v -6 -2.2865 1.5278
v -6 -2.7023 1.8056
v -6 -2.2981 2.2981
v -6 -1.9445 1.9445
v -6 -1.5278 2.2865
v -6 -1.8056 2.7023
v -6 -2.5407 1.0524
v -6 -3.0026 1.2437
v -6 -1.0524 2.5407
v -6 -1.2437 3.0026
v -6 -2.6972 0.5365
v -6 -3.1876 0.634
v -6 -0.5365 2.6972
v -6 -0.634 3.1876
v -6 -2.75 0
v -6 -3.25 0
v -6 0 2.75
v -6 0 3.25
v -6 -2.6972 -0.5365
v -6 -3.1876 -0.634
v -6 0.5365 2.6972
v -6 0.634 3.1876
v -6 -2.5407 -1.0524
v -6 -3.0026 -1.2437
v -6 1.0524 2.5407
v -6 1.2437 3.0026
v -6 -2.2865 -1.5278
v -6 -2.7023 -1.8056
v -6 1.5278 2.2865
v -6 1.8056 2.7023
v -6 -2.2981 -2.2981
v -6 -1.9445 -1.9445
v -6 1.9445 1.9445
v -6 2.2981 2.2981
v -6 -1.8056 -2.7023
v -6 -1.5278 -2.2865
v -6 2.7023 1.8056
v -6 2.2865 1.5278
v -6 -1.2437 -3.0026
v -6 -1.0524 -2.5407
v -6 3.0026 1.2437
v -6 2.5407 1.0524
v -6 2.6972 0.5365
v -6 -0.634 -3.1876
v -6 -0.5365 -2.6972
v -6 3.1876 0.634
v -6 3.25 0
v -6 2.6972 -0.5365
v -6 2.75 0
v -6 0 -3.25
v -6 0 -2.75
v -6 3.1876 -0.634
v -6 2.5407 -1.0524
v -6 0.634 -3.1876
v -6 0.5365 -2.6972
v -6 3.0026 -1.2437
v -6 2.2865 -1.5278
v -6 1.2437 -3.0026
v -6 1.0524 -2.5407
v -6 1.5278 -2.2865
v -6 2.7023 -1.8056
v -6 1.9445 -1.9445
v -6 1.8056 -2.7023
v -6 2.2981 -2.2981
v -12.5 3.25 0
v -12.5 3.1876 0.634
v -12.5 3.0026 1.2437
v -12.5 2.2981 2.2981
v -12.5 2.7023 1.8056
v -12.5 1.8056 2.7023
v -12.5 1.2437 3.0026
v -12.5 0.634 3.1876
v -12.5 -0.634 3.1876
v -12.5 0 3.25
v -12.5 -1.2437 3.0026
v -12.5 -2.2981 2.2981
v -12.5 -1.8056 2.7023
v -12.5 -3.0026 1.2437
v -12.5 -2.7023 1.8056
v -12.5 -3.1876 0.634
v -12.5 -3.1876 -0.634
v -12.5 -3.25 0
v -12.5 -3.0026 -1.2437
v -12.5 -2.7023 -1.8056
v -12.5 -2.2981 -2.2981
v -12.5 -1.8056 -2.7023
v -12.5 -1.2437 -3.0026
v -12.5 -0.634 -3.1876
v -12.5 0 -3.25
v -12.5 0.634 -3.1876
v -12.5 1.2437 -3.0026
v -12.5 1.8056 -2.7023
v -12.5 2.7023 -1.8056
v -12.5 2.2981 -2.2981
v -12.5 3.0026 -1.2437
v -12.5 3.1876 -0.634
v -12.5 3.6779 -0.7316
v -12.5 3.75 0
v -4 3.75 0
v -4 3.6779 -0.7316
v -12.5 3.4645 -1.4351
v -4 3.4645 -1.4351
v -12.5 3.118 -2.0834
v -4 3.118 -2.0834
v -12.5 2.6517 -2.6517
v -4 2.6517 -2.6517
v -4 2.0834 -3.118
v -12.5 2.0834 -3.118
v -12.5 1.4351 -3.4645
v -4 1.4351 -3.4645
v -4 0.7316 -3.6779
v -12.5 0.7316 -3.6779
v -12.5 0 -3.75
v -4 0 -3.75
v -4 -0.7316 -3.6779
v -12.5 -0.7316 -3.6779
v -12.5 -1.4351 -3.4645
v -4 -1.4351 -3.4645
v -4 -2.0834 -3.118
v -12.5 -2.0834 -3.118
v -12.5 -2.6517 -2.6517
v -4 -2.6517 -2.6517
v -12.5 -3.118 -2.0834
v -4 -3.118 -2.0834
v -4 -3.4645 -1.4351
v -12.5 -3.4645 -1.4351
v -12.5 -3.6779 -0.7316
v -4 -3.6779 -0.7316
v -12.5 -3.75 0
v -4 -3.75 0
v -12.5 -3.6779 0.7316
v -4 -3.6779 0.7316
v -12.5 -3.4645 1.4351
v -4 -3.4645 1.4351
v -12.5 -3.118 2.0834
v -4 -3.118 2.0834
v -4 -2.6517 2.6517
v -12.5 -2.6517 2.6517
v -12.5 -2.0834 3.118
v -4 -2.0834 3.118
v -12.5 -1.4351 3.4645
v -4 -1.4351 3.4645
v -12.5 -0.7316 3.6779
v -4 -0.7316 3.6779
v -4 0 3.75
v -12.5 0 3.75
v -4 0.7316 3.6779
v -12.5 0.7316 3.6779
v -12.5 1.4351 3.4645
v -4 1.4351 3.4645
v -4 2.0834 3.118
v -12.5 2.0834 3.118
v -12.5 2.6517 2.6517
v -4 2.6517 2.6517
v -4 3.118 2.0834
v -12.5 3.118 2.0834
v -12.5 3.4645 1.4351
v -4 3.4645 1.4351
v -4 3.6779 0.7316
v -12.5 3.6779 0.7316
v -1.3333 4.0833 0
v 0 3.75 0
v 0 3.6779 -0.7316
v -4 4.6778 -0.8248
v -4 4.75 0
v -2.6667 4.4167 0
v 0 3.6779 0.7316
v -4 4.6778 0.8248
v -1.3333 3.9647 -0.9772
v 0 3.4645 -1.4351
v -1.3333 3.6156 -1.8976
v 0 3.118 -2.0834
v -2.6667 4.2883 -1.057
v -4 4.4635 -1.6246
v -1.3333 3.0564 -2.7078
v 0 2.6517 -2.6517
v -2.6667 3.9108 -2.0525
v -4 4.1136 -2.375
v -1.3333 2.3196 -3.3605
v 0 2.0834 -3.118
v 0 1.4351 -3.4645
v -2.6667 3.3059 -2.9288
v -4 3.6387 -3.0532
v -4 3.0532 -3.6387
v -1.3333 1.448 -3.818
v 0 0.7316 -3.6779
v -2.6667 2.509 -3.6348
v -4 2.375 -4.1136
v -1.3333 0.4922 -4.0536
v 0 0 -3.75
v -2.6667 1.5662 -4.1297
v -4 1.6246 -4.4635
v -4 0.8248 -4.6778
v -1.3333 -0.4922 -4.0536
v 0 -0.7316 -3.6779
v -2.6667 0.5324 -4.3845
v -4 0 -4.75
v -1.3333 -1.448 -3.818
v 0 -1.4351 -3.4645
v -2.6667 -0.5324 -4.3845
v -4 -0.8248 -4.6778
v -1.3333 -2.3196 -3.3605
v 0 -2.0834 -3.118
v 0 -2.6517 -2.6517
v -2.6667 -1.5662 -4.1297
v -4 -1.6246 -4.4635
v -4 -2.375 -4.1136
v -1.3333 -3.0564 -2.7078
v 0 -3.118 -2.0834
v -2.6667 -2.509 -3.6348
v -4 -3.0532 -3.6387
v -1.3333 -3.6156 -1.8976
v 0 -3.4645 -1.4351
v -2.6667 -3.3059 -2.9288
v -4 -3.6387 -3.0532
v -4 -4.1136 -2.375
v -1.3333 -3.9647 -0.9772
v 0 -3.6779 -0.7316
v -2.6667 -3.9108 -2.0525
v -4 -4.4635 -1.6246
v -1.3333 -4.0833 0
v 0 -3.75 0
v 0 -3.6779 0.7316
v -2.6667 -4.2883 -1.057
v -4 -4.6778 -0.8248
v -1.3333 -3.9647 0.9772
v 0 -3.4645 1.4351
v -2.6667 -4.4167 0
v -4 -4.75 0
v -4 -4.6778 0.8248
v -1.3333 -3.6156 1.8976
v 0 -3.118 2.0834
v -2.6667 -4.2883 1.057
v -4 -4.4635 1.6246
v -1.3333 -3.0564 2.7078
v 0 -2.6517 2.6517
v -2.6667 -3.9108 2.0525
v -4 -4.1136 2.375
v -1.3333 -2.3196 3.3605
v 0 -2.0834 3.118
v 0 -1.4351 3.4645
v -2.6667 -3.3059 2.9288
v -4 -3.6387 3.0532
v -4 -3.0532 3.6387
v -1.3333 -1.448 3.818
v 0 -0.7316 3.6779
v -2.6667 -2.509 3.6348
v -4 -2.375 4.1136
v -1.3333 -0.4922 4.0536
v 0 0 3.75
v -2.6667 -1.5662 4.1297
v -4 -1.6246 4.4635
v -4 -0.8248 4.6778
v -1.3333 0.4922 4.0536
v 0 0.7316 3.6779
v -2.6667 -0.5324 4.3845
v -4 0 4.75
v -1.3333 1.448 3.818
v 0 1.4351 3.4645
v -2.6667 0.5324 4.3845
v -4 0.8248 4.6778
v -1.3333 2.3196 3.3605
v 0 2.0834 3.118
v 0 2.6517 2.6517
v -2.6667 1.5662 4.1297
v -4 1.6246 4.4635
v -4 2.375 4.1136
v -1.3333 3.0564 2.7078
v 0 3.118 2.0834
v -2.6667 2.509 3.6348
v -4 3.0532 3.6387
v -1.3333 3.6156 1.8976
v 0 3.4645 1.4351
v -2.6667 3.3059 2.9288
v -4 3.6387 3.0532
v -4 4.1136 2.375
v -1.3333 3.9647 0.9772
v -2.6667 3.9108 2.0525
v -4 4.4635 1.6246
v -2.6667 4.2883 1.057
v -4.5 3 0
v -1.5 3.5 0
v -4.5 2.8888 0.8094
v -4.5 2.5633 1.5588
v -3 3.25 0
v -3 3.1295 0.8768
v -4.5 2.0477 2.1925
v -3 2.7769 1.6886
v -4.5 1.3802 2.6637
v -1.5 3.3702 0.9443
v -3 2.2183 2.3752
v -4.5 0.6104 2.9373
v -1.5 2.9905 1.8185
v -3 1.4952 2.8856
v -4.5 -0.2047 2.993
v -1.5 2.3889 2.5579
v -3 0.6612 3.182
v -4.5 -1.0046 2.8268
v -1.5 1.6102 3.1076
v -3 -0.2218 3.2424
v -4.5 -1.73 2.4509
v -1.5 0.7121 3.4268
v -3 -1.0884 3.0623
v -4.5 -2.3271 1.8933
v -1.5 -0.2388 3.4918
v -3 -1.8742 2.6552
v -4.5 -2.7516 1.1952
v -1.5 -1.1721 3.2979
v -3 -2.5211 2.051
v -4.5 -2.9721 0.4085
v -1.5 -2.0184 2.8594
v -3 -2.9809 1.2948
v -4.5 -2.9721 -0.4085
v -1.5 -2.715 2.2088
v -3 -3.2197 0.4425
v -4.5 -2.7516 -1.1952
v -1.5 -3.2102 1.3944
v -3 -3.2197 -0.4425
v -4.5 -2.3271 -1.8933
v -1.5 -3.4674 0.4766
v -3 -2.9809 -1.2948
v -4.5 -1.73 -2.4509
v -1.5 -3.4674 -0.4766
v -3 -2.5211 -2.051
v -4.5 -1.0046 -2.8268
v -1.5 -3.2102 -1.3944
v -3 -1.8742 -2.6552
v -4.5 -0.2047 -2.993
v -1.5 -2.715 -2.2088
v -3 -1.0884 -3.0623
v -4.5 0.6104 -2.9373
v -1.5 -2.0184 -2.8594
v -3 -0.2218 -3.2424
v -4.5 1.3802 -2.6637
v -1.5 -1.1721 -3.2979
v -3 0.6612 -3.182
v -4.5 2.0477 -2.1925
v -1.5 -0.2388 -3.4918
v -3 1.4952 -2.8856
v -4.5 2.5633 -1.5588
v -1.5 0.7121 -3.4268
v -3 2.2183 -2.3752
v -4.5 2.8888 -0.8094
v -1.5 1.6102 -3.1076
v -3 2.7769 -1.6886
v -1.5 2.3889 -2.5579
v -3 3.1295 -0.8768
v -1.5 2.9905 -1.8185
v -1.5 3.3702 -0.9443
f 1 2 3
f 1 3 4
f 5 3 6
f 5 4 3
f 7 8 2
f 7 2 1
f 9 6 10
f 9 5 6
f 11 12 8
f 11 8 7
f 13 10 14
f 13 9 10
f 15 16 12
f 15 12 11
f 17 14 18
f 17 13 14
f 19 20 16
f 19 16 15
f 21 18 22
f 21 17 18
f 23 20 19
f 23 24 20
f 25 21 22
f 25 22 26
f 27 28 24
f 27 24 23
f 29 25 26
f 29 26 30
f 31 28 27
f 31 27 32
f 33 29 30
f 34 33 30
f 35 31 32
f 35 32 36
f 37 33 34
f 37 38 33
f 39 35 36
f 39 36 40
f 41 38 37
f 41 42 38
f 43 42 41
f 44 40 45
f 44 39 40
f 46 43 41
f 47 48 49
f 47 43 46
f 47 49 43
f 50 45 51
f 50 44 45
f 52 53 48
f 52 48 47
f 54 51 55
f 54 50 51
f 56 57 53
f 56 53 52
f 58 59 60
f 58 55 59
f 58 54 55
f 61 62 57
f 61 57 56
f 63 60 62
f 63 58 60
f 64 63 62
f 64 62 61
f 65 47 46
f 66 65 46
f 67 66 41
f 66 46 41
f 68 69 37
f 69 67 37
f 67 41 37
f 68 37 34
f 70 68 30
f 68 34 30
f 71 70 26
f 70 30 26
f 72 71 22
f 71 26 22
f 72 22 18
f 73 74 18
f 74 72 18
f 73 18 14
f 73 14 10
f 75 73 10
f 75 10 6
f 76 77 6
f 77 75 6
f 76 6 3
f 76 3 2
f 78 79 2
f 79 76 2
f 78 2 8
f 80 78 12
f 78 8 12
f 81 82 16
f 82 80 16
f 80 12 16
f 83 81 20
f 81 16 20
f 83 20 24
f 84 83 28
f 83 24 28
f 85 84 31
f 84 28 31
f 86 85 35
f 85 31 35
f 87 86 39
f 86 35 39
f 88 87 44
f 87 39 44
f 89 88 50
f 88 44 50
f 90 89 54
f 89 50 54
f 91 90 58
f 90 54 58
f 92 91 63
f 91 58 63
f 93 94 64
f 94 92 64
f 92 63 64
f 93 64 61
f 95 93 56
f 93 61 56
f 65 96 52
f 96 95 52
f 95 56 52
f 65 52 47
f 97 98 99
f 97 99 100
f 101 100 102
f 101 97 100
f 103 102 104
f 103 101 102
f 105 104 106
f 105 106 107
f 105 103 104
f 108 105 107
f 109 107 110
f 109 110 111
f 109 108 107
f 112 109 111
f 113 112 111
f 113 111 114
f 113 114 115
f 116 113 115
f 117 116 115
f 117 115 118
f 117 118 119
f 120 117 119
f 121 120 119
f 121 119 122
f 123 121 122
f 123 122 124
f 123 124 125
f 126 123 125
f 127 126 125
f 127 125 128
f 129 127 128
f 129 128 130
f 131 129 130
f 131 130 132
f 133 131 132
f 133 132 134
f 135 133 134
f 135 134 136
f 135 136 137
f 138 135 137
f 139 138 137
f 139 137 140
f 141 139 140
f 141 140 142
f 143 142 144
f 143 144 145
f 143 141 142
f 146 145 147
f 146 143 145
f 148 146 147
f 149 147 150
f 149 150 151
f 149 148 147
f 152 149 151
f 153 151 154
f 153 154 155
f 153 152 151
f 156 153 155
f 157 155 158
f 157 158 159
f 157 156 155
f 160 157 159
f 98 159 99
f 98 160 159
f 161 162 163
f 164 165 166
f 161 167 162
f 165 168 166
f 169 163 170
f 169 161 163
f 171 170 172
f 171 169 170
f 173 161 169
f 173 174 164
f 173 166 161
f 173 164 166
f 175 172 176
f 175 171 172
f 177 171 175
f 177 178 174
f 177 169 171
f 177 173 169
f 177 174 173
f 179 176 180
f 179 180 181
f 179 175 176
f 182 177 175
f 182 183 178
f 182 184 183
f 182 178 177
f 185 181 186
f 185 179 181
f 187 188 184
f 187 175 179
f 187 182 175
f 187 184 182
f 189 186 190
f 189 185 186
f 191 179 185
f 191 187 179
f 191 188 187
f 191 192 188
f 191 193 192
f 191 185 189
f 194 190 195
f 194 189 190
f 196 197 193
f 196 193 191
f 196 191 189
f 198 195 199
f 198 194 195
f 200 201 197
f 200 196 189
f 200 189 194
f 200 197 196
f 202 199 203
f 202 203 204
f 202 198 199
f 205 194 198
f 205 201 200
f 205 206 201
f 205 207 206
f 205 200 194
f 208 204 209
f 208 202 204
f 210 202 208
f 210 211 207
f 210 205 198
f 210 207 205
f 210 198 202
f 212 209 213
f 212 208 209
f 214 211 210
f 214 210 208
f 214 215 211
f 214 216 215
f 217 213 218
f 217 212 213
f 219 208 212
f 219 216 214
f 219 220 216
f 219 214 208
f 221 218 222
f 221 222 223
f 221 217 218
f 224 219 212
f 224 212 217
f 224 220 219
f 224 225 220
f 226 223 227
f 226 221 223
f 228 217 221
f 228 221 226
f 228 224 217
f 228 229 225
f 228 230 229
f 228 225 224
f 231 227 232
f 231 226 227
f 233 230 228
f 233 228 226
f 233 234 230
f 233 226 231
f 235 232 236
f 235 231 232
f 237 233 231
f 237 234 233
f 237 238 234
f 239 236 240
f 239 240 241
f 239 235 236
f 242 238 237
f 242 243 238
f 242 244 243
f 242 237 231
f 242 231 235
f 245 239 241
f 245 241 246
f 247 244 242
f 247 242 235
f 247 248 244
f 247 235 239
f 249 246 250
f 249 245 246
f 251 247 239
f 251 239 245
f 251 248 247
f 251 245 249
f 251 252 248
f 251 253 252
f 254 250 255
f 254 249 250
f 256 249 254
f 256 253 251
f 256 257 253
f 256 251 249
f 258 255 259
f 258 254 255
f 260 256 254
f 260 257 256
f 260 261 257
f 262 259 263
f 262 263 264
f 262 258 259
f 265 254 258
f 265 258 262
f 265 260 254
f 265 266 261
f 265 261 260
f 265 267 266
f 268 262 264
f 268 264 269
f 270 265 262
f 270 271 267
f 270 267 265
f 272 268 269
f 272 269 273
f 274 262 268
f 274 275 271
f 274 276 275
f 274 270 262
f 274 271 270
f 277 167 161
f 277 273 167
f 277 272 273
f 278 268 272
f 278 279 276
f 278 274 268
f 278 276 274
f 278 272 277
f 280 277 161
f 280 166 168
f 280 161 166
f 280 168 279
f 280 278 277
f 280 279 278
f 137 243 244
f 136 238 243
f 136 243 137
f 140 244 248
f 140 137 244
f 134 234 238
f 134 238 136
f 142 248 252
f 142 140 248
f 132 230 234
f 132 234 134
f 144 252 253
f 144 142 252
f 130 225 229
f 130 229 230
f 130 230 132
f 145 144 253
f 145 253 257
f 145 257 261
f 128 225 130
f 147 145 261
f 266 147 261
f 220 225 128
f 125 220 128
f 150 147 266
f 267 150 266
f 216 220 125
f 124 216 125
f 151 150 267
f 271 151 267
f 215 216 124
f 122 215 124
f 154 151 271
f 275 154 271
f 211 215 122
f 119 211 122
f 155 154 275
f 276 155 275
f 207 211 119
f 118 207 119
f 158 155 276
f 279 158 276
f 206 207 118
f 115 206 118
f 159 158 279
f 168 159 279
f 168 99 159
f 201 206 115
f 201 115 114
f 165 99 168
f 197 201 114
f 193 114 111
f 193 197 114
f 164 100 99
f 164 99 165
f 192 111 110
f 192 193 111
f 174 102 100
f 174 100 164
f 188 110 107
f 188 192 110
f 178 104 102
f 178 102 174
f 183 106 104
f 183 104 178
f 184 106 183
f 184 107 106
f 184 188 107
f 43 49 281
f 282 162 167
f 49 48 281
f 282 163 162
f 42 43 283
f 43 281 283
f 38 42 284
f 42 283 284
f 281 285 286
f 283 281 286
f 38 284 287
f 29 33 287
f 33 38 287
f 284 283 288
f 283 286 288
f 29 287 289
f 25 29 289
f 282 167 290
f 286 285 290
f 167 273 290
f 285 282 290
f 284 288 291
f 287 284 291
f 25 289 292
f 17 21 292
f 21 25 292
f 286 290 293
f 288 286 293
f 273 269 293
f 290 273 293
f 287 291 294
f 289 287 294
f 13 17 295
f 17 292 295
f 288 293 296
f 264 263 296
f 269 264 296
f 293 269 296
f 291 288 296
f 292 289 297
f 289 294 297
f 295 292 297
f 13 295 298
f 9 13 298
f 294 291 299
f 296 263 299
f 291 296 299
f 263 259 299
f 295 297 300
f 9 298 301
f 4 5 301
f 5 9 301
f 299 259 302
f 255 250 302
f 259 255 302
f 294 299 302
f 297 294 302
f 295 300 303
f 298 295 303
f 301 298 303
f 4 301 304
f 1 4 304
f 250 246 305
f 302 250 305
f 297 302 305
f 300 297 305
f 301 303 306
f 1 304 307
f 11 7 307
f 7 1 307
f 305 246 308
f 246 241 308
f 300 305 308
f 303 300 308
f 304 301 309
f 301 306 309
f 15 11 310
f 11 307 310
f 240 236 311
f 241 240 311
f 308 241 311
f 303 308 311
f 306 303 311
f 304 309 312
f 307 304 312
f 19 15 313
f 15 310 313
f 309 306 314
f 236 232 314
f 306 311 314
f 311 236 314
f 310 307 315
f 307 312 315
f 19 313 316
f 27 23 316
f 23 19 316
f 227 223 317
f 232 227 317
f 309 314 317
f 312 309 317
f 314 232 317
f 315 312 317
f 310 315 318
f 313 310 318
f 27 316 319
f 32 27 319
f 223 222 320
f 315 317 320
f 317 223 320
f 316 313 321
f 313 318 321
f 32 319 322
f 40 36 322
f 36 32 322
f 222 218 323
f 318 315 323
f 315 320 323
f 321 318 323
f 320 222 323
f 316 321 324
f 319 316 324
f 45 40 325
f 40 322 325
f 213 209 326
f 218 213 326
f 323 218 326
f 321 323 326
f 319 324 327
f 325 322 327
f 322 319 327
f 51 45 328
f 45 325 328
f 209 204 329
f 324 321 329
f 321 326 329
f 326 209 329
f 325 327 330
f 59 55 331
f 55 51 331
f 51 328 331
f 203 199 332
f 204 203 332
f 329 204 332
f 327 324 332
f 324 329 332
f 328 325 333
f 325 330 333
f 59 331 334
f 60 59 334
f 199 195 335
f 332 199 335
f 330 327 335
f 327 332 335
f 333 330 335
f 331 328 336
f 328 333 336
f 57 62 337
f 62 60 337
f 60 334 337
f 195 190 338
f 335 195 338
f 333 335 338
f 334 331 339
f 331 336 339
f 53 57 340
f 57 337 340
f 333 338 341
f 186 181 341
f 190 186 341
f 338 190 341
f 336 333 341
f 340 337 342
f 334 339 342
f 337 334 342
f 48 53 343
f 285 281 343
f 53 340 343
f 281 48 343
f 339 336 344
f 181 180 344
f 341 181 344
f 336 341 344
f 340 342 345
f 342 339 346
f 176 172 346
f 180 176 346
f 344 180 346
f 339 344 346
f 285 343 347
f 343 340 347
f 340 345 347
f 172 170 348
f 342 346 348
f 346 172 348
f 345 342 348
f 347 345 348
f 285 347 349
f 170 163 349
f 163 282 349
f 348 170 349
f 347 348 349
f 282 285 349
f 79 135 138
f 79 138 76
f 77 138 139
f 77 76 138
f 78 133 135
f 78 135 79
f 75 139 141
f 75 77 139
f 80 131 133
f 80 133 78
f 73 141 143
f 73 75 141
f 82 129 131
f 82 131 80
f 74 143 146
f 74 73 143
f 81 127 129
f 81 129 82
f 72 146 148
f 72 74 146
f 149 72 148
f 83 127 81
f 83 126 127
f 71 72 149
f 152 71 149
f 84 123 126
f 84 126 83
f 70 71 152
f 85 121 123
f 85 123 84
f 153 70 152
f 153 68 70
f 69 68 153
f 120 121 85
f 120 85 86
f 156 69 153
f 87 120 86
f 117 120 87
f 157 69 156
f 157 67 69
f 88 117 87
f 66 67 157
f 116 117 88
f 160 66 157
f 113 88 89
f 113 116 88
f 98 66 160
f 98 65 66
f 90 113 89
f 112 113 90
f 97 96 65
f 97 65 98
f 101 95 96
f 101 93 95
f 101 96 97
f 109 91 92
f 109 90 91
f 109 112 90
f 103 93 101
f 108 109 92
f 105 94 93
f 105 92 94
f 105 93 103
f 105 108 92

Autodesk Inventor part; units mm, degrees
ref_plane "YZ Plane" through (0, 0, 0) normal (1, 0, 0) x (0, 1, 0)
ref_plane "XZ Plane" through (0, 0, 0) normal (0, 1, 0) x (-1, 0, 0)
ref_plane "XY Plane" through (0, 0, 0) normal (0, 0, 1) x (1, 0, 0)
sketch "Эскиз1" plane through (0, 0, 0) normal (0, 0, 1) x (1, 0, 0)
  line L0 (0, 0) -> (-21.4884, 0)
  line L1 (0, 3.75) -> (-4, 4.75)
  line L2 (-4, 4.75) -> (-4, 3.75)
  line L3 (-4, 3.75) -> (-12.5, 3.75)
  line L4 (-12.5, 3.75) -> (-12.5, 3.25)
  line L5 (-12.5, 3.25) -> (-6, 3.25)
  line L6 (-6, 3.25) -> (-6, 2.75)
  line L7 (-6, 2.75) -> (0, 3.75)
  dimension "d1" = 8.5
  dimension "d2" = 1
  dimension "d3" = 0.5
  dimension "d4" = 6.5
  dimension "d5" = 4
  dimension "d6" = 0
  dimension "d9" = 3.75
  dimension "d10" = 2.75
  dimension "d11" = 3.75
revolve "Вращение1" add sketch "Эскиз1" angle 360 about axis through (0, 0, 0) along (-1, 0, 0)
properties part number "корпус фары"
